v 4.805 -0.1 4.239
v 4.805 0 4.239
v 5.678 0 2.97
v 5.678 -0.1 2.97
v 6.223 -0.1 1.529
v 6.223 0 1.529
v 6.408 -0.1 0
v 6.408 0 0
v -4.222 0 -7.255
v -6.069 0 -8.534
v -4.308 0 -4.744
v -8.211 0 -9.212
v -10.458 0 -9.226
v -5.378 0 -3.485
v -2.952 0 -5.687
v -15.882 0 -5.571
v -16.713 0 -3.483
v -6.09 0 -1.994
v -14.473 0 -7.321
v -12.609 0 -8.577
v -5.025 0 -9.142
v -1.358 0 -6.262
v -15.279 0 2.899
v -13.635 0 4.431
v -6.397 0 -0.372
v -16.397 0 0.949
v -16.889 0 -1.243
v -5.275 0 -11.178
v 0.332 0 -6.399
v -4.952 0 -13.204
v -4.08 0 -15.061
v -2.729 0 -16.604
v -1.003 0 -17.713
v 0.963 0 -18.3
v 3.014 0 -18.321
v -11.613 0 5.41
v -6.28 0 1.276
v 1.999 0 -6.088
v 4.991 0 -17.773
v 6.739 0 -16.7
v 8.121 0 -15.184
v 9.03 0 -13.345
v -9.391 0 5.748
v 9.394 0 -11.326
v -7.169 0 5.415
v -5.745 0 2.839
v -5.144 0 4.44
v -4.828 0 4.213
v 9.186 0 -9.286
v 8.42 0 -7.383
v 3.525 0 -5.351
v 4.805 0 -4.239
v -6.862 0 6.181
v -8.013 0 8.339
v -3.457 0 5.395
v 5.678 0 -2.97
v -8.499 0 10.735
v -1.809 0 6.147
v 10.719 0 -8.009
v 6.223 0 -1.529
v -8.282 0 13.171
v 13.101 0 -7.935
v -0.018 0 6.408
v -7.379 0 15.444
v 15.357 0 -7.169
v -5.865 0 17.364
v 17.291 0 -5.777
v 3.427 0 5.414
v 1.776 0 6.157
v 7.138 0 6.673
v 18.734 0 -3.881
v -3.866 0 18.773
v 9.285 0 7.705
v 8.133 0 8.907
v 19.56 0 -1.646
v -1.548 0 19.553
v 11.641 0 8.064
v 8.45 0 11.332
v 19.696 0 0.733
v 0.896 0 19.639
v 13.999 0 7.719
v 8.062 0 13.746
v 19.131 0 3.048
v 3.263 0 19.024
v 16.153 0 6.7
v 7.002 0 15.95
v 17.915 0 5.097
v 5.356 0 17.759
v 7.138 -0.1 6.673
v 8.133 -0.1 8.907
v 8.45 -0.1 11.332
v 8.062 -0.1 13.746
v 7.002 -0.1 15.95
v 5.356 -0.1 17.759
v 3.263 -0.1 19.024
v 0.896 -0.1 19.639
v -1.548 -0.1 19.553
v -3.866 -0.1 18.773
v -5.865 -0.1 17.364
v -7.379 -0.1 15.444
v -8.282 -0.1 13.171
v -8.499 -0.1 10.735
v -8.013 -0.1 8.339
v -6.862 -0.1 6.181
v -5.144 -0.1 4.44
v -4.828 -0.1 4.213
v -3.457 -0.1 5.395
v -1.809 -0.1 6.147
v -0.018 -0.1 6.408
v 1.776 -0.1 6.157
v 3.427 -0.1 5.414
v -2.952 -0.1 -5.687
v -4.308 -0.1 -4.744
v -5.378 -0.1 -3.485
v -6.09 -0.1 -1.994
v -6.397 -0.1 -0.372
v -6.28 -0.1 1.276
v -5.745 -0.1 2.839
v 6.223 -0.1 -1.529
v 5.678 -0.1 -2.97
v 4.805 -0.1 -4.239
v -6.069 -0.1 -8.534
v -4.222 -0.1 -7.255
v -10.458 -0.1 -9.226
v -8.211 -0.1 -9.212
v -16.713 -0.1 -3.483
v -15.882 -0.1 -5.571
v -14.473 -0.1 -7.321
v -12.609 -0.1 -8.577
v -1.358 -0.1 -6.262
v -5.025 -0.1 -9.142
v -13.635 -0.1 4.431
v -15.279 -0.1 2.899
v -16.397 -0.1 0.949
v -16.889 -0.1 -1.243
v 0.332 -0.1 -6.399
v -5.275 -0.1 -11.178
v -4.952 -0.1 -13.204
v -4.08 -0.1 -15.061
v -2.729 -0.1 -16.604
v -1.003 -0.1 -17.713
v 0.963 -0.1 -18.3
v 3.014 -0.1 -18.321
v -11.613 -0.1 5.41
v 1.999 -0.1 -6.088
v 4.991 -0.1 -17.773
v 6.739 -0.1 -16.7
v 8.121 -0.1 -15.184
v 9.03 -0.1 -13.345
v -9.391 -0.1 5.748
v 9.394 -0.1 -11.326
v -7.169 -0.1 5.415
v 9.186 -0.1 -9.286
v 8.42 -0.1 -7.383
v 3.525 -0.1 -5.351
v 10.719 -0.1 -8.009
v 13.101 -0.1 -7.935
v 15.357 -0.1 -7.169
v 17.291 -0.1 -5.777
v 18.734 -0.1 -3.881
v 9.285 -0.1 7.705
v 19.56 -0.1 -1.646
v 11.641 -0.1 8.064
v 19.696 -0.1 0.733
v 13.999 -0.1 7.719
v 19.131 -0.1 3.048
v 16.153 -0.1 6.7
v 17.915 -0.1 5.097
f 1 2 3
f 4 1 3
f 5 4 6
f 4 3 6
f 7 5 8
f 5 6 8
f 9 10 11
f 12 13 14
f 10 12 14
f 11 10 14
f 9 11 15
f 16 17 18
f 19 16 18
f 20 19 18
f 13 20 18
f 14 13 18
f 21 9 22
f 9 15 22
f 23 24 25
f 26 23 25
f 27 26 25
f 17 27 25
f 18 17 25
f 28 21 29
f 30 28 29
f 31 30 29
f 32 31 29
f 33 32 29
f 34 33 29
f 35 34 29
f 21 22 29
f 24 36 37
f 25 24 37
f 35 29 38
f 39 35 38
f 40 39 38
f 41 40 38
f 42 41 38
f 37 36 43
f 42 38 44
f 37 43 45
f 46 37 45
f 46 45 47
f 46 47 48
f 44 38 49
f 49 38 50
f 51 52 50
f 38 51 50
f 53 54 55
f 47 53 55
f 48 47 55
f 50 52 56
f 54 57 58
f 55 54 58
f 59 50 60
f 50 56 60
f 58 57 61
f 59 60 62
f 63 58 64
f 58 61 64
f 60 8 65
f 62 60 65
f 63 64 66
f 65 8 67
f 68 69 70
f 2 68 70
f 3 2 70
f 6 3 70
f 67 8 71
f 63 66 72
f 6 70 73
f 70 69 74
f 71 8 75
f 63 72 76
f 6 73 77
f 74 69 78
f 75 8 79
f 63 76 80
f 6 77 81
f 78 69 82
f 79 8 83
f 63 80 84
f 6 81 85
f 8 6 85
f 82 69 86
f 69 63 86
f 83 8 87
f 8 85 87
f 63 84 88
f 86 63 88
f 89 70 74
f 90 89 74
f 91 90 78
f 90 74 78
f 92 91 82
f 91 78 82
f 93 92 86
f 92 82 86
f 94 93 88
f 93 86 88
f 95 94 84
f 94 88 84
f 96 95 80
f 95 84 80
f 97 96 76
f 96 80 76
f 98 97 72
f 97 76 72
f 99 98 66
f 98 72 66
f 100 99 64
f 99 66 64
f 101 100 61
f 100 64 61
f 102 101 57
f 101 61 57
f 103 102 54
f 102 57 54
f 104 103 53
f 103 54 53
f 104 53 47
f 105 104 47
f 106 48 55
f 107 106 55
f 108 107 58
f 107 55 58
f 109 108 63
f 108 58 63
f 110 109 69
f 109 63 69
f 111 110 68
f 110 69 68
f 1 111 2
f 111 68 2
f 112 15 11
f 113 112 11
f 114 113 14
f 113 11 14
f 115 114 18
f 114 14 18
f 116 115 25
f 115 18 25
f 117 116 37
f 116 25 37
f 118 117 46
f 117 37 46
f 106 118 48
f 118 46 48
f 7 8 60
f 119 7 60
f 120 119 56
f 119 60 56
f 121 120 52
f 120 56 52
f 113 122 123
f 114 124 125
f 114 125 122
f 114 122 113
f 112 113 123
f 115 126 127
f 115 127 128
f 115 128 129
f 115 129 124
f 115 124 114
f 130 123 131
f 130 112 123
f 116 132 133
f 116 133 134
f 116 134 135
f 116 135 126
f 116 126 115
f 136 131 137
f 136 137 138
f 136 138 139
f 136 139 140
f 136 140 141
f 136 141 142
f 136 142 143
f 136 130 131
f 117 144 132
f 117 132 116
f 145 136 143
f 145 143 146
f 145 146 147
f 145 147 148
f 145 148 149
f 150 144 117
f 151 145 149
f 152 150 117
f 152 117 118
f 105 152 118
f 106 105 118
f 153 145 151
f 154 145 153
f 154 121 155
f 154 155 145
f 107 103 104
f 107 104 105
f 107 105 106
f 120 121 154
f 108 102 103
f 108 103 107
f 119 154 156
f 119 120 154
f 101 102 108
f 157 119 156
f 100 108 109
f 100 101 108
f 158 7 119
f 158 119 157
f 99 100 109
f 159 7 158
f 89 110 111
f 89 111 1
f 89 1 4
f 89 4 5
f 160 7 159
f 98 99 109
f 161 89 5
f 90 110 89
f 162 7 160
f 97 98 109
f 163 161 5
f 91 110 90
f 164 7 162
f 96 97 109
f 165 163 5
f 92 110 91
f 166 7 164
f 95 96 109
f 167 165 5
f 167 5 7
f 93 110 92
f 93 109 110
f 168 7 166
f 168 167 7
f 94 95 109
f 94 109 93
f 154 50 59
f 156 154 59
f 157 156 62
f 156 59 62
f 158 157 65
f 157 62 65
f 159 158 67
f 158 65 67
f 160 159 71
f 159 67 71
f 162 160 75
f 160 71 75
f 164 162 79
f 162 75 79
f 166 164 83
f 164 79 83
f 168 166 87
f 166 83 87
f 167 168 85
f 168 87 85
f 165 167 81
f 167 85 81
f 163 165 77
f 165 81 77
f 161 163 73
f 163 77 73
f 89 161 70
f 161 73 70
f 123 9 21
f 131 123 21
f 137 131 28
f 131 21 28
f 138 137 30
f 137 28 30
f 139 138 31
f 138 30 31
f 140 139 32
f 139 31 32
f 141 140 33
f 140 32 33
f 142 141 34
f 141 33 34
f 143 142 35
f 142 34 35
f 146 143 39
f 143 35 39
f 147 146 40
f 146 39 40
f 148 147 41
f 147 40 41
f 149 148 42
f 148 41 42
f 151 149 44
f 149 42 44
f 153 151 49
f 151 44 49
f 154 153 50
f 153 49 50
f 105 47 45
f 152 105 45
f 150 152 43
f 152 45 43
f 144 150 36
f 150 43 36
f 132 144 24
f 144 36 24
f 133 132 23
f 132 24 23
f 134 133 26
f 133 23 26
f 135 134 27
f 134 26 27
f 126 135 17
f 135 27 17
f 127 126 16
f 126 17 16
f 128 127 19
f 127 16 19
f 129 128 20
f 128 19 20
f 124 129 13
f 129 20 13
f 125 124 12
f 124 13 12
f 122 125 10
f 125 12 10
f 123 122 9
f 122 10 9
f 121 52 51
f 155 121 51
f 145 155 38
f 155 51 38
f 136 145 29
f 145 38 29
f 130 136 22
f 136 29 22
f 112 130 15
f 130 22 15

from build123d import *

# Parameters (mm, degrees)
F1_DEPTH = 0.1


with BuildPart() as f1:
    # F0 (on Front) → F1 (new body)
    with BuildSketch(Plane.XZ):
        with BuildLine():
            ThreePointArc((4.8052448645, 4.2392099088), (5.9938653468, 2.2660223), (6.4079075258, 0))
            ThreePointArc((6.4079075258, 0), (5.9938653468, -2.2660223), (4.8052448645, -4.2392099088))
            ThreePointArc((4.8052448645, -4.2392099088), (6.8764974545, -5.5075560727), (8.4202976896, -7.38251477))
            ThreePointArc((8.4202976896, -7.38251477), (19.6961982172, 0.7329368237), (7.1375086194, 6.6731222471))
            ThreePointArc((7.1375086194, 6.6731222471), (6.0935080211, 5.3391354228), (4.8052448645, 4.2392099088))
        make_face()
        with BuildLine():
            ThreePointArc((7.1375086194, 6.6731222471), (5.8427804889, 5.5793917075), (4.8052448645, 4.2392099088))
            ThreePointArc((4.8052448645, 4.2392099088), (6.0935080211, 5.3391354228), (7.1375086194, 6.6731222471))
        make_face()
        with BuildLine():
            ThreePointArc((-4.8283466328, 4.2128787845), (-0.0175144213, 6.4078835901), (4.8052448645, 4.2392099088))
            ThreePointArc((4.8052448645, 4.2392099088), (5.8427804889, 5.5793917075), (7.1375086194, 6.6731222471))
            ThreePointArc((7.1375086194, 6.6731222471), (-1.5477052479, 19.5526553507), (-5.1442647229, 4.4404062517))
            ThreePointArc((-5.1442647229, 4.4404062517), (-4.9848340595, 4.3286858356), (-4.8283466328, 4.2128787845))
        make_face()
        with BuildLine():
            ThreePointArc((8.4202976896, -7.38251477), (6.3739752542, -6.0854969279), (4.8052448645, -4.2392099088))
            ThreePointArc((4.8052448645, -4.2392099088), (1.1757337965, -6.2991212799), (-2.9524774752, -5.6871922438))
            ThreePointArc((-2.9524774752, -5.6871922438), (-3.534399564, -6.5137001688), (-4.2218378667, -7.2547651103))
            ThreePointArc((-4.2218378667, -7.2547651103), (1.9874253454, -18.3828453768), (8.4202976896, -7.38251477))
        make_face()
        with BuildLine():
            ThreePointArc((8.4202976896, -7.38251477), (6.8764974545, -5.5075560727), (4.8052448645, -4.2392099088))
            ThreePointArc((4.8052448645, -4.2392099088), (6.3739752542, -6.0854969279), (8.4202976896, -7.38251477))
        make_face()
        with BuildLine():
            ThreePointArc((-2.9524774752, -5.6871922438), (-6.2958841747, -1.1929464859), (-4.8283466328, 4.2128787845))
            ThreePointArc((-4.8283466328, 4.2128787845), (-4.9876113011, 4.324829682), (-5.1442647229, 4.4404062517))
            ThreePointArc((-5.1442647229, 4.4404062517), (-16.8849803616, -2.3695755088), (-4.2218378667, -7.2547651103))
            ThreePointArc((-4.2218378667, -7.2547651103), (-3.6412753486, -6.427156257), (-2.9524774752, -5.6871922438))
        make_face()
        with BuildLine():
            ThreePointArc((-5.1442647229, 4.4404062517), (-4.9876113011, 4.324829682), (-4.8283466328, 4.2128787845))
            ThreePointArc((-4.8283466328, 4.2128787845), (-4.9848340595, 4.3286858356), (-5.1442647229, 4.4404062517))
        make_face()
        with BuildLine():
            ThreePointArc((-4.2218378667, -7.2547651103), (-3.534399564, -6.5137001688), (-2.9524774752, -5.6871922438))
            ThreePointArc((-2.9524774752, -5.6871922438), (-3.6412753486, -6.427156257), (-4.2218378667, -7.2547651103))
        make_face()
    extrude(amount=F1_DEPTH)


solid = f1.part
